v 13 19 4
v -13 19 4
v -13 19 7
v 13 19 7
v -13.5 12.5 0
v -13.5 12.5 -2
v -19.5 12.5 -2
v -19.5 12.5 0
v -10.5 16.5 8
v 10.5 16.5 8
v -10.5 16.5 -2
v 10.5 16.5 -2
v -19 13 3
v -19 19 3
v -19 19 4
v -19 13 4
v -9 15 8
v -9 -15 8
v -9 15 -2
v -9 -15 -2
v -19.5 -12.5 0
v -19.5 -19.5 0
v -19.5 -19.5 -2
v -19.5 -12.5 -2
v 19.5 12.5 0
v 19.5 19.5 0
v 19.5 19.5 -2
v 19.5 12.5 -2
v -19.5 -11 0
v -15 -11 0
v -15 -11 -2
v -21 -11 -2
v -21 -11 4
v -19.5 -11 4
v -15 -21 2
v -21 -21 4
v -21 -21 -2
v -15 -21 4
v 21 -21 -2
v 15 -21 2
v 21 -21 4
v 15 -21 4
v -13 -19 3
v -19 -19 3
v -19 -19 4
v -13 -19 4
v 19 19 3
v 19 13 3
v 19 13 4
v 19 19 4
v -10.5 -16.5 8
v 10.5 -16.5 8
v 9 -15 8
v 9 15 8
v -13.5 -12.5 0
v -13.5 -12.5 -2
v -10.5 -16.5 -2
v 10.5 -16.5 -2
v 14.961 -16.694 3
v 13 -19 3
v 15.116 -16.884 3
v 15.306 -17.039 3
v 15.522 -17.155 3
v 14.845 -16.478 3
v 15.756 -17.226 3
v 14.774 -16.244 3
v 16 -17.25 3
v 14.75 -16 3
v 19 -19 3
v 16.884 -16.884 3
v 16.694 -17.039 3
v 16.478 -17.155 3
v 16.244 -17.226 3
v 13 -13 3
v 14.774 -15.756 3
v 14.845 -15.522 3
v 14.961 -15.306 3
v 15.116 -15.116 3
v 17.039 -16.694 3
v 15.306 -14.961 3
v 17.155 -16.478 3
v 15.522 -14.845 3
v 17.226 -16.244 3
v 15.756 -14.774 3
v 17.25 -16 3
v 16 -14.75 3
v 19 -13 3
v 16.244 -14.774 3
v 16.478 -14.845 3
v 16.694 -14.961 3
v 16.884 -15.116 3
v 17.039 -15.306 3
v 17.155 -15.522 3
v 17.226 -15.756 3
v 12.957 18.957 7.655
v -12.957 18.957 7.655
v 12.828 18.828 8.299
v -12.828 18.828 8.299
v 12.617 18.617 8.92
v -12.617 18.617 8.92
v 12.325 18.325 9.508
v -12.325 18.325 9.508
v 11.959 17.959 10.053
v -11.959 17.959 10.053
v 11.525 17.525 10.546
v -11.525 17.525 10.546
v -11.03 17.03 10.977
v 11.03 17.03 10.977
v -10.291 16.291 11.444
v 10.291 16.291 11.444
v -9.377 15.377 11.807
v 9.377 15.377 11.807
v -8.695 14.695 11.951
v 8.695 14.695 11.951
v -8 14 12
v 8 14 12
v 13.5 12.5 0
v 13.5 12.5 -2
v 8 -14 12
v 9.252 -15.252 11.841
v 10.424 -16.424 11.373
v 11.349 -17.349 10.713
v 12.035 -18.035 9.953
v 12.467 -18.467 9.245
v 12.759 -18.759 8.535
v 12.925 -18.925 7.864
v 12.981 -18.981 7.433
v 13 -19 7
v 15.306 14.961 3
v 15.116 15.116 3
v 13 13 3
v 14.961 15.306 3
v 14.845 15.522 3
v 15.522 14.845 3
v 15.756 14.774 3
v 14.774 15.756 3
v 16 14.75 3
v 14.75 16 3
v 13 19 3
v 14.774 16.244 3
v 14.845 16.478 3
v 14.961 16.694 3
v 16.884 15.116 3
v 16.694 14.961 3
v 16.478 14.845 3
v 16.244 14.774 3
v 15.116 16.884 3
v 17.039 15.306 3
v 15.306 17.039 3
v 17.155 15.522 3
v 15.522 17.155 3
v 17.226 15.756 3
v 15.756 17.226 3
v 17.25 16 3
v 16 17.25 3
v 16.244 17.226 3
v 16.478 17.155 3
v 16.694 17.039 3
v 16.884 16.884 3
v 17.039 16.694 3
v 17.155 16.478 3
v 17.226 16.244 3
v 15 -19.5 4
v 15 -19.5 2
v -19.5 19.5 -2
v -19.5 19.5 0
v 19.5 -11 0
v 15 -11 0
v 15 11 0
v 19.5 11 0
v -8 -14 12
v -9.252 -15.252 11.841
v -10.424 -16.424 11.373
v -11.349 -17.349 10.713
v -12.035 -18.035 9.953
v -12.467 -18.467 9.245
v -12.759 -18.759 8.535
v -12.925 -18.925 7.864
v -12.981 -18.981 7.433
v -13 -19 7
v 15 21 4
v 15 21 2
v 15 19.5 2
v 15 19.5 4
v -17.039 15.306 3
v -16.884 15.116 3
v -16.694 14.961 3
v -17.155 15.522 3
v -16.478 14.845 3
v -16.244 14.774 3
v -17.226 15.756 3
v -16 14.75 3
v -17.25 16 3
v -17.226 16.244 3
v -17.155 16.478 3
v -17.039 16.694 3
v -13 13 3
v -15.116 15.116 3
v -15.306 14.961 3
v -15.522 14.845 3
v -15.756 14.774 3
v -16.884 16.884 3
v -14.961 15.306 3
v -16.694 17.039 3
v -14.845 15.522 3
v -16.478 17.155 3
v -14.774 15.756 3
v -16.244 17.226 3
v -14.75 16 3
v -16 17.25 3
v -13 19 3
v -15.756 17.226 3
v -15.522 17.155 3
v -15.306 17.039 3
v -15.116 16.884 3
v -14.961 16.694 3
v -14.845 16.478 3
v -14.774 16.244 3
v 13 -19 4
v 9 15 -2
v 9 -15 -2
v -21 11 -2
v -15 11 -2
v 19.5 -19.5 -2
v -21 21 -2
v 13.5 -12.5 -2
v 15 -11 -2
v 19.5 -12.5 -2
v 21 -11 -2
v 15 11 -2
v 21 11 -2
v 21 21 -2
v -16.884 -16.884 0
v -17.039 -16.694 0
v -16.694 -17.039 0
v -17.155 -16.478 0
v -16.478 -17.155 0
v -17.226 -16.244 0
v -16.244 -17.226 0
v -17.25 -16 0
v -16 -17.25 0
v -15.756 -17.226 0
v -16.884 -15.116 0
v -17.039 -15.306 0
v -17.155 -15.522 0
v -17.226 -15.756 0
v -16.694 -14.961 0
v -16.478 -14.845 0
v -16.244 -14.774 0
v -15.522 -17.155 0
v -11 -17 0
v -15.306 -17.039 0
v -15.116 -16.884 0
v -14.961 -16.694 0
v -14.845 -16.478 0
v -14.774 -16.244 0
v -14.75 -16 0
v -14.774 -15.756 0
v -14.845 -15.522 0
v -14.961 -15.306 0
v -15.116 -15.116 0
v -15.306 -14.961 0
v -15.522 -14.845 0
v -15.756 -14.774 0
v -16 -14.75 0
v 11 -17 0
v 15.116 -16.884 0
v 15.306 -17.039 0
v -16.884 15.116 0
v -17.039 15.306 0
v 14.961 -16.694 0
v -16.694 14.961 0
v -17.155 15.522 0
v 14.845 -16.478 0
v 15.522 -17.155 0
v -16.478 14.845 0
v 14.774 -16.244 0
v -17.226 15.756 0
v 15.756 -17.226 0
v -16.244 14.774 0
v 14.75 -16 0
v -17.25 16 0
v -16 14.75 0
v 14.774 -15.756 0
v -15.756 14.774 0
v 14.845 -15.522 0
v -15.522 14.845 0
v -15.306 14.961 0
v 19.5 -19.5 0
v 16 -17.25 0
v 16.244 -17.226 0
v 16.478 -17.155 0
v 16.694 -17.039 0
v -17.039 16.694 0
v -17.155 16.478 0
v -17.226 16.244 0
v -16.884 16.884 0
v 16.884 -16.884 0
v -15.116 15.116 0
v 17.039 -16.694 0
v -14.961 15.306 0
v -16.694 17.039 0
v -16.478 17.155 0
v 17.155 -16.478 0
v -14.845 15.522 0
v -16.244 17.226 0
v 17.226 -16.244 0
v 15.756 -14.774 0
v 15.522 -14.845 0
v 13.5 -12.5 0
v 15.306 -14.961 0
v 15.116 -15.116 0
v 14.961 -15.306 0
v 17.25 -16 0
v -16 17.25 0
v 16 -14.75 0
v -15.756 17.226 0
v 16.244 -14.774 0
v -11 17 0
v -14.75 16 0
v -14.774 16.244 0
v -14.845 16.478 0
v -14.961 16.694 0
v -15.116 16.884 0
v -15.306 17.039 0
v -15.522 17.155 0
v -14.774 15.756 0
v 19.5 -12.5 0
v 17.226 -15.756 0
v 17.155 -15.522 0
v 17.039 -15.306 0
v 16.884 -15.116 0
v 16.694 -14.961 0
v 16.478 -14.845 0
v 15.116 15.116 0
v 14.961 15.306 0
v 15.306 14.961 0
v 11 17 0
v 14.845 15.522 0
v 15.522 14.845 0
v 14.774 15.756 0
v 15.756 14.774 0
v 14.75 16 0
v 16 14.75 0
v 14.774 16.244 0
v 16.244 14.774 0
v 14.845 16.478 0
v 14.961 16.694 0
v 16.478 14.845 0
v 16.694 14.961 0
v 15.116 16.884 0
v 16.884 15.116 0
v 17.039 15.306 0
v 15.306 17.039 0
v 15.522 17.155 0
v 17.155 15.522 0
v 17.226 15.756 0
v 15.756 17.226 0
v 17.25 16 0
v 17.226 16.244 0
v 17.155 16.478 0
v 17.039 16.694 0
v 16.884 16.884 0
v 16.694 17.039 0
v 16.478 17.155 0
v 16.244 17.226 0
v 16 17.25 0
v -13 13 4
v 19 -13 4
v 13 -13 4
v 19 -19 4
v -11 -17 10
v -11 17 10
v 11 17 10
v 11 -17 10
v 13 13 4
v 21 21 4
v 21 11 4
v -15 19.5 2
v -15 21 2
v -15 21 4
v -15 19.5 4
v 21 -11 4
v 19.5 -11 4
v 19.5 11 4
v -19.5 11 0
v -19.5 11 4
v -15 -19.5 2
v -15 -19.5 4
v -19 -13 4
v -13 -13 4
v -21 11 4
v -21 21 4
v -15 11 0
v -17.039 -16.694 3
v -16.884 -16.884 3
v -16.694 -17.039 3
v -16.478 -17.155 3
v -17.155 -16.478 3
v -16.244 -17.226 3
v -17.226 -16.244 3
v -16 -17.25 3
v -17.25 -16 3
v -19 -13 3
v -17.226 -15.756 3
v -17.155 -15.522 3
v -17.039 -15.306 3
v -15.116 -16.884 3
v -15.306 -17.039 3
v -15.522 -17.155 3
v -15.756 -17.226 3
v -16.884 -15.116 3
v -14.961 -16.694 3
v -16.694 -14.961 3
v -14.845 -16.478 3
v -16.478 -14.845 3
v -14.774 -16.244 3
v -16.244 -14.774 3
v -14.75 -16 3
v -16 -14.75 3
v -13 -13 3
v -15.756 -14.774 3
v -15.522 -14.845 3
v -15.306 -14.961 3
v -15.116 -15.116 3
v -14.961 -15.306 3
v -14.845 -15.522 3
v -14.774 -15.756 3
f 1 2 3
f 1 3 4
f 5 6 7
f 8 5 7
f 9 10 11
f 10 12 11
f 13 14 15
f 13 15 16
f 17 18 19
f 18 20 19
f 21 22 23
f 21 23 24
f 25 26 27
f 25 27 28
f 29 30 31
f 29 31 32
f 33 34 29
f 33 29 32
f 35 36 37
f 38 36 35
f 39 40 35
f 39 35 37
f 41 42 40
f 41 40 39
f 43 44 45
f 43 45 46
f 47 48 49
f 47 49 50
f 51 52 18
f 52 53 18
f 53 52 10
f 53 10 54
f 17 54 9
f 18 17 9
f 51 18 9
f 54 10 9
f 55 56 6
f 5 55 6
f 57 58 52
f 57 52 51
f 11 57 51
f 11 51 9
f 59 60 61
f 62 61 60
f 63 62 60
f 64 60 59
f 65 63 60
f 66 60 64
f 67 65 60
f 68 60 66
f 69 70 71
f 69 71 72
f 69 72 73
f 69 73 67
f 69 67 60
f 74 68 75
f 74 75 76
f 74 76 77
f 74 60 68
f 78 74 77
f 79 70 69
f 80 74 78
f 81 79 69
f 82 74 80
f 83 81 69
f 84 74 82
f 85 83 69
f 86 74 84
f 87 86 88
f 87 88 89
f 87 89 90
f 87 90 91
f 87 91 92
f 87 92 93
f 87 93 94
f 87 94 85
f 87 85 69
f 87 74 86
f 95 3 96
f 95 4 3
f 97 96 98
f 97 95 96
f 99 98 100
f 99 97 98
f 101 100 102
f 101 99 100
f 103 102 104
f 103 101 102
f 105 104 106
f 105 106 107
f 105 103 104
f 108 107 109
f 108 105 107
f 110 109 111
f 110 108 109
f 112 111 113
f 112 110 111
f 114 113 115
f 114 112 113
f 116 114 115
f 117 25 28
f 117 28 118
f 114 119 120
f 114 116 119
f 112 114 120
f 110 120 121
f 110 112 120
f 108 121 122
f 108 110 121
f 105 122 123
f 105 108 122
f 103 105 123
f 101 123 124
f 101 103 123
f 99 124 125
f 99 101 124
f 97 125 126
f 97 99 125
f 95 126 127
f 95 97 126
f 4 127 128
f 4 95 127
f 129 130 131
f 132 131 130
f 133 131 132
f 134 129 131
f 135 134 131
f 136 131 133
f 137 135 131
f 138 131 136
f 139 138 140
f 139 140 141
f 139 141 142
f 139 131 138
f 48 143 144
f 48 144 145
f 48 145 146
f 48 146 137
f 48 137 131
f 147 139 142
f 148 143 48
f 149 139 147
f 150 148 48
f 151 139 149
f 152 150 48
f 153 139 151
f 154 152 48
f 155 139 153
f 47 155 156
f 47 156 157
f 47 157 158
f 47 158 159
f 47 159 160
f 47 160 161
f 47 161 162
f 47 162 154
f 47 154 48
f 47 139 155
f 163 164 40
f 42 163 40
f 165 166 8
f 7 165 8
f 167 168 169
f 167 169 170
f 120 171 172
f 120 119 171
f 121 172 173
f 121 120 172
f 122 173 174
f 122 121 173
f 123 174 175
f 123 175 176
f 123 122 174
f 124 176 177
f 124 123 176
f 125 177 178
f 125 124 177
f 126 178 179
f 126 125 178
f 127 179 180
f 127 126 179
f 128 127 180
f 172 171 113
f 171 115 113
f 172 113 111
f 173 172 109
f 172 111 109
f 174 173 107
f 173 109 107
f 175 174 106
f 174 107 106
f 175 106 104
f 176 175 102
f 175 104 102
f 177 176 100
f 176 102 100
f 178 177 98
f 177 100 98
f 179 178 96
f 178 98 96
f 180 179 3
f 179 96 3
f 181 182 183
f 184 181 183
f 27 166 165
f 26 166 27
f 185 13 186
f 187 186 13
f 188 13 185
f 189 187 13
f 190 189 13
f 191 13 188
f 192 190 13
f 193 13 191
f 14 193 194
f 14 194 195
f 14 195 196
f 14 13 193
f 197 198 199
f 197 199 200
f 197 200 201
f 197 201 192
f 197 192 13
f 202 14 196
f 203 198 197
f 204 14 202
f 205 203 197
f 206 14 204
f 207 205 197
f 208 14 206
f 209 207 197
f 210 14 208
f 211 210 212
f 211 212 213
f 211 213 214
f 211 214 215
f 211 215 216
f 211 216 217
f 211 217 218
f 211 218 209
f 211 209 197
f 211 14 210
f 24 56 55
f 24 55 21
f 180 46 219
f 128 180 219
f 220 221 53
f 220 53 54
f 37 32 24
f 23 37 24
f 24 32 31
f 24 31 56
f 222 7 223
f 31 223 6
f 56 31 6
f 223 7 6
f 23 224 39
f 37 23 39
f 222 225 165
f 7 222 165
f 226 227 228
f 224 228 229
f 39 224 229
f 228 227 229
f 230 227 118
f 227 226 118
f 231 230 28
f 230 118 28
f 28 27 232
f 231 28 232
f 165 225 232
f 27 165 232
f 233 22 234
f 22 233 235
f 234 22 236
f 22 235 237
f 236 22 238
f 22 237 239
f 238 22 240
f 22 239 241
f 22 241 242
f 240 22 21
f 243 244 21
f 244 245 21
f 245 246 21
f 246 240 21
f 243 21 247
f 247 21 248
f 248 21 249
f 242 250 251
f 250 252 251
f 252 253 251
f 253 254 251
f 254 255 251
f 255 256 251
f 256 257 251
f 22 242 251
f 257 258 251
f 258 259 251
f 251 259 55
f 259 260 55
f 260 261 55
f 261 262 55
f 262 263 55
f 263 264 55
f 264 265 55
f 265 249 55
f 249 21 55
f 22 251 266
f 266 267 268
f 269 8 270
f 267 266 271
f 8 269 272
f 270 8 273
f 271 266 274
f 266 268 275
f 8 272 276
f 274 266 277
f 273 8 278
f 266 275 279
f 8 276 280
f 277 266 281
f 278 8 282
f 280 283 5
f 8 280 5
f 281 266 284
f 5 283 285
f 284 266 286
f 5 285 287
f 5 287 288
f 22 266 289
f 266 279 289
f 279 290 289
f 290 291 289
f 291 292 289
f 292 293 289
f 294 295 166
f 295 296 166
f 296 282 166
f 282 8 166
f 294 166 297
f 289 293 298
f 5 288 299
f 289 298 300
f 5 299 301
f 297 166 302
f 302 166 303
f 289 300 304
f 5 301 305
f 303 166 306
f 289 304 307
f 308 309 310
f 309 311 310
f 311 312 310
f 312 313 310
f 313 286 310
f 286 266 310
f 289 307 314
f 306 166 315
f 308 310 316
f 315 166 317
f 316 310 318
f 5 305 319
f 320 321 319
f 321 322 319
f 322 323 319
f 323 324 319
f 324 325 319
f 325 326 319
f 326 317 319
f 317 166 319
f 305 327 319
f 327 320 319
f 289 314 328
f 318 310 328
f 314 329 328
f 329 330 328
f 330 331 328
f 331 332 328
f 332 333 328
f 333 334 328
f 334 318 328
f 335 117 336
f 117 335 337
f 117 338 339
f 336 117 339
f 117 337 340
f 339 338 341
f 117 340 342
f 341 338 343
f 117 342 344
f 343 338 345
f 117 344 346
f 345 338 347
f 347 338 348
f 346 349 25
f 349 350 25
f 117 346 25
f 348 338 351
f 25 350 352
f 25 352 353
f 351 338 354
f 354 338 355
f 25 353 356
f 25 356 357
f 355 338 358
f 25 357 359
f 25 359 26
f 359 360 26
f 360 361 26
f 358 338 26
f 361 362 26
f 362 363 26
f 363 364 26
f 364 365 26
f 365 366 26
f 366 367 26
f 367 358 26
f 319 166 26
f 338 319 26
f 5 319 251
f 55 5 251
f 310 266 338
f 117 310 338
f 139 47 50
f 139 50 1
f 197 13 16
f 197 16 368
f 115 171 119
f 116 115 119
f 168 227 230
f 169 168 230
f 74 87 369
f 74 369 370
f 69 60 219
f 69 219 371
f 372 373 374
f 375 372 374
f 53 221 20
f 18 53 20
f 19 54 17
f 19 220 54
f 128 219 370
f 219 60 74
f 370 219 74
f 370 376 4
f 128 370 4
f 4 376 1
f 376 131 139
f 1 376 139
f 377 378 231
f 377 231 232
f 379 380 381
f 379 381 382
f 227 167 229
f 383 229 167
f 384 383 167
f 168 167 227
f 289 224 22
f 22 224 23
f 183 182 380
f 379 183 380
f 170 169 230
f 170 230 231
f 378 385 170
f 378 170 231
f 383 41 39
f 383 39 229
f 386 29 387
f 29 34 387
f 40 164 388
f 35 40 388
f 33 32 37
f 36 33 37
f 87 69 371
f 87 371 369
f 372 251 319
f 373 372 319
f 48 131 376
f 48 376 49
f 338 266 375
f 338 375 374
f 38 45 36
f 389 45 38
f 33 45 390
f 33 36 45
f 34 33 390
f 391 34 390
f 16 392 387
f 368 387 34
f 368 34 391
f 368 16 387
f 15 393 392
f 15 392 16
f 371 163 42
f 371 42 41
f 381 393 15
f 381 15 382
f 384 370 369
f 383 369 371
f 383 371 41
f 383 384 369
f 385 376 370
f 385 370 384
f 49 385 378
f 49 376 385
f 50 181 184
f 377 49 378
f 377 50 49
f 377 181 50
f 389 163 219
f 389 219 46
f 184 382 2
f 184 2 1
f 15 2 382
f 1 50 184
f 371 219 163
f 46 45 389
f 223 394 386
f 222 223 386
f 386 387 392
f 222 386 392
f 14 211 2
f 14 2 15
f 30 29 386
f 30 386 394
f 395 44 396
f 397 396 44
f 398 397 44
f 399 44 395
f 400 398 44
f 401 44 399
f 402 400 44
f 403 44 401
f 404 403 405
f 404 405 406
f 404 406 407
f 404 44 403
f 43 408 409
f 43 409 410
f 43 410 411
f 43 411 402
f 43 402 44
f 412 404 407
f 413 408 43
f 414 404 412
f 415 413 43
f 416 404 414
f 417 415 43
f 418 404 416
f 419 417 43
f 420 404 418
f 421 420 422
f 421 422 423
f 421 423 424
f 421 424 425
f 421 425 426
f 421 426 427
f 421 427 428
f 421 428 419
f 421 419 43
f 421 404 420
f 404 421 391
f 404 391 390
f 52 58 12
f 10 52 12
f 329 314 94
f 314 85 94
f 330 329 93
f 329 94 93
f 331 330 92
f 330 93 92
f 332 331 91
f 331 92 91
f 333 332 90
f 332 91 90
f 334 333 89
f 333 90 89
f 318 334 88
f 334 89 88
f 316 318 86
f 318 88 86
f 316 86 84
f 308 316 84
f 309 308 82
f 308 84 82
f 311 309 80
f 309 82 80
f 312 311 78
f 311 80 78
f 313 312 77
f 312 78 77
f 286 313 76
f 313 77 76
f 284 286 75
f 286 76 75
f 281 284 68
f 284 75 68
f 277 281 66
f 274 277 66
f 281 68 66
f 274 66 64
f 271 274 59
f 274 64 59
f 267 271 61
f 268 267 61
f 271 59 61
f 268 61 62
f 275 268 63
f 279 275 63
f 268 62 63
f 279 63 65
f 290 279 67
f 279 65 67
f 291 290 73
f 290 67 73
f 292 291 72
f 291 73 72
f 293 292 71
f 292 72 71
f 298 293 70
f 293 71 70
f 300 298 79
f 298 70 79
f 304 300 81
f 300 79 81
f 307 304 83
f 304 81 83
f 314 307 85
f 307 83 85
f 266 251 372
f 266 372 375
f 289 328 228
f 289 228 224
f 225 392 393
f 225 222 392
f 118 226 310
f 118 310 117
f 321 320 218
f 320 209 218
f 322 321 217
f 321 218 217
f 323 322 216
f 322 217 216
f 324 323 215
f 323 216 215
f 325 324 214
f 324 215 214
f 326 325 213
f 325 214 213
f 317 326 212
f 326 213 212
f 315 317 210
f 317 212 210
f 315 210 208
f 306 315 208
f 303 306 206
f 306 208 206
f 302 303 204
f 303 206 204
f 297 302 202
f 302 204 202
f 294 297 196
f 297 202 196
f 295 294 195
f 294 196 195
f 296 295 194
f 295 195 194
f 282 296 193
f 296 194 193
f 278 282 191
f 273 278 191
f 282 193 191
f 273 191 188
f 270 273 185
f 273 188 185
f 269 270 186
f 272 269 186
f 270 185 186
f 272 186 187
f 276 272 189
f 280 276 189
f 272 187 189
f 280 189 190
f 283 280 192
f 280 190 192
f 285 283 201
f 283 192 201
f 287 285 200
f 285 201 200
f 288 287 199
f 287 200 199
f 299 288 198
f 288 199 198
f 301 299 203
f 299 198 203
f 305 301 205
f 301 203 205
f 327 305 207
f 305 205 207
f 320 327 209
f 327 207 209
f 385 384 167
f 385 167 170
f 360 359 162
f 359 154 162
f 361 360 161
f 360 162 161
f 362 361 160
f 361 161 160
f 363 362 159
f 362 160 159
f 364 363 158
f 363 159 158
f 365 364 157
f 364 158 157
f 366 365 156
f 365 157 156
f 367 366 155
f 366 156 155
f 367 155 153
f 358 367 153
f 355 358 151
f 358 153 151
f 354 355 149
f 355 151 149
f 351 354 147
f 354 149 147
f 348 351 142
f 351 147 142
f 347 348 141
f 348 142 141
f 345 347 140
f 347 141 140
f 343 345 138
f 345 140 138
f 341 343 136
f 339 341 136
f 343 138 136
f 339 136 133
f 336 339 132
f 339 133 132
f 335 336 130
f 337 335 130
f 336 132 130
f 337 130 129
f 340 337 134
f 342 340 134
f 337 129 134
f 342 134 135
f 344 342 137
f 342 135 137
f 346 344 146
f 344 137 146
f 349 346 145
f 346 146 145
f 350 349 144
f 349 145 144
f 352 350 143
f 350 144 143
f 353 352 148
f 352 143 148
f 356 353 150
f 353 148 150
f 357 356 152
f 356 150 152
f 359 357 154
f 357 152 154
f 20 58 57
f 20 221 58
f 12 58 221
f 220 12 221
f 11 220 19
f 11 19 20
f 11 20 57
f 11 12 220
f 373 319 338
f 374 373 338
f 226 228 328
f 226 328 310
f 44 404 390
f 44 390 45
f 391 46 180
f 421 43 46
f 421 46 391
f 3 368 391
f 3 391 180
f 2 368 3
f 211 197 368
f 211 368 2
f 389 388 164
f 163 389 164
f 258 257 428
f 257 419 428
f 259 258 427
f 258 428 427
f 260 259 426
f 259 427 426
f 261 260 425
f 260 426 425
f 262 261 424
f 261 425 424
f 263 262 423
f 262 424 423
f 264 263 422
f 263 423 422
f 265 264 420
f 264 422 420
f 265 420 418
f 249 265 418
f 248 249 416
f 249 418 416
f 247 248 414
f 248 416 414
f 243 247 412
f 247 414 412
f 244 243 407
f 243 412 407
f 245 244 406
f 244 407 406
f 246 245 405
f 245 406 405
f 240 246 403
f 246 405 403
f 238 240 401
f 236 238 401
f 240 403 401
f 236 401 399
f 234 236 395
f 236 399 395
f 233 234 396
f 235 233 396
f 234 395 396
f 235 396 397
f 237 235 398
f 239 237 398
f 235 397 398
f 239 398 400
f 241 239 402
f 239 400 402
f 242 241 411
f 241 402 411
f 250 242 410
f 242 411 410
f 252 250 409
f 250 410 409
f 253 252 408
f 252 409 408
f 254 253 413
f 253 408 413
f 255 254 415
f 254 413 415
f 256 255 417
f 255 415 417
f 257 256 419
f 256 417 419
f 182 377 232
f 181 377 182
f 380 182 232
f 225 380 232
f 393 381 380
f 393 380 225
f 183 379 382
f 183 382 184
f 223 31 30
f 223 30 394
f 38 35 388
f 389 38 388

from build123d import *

# Parameters (mm, degrees)
SKETCH_1_W               = 26
SKETCH_1_H               = 38
EXTRUDE_1_DEPTH          = 12
SKETCH_2_W               = 22
SKETCH_2_H               = 34
CUT_EXTRUDE_1_DEPTH      = 10
SKETCH_4_W               = 6
SKETCH_4_H               = 6
EXTRUDE_2_DEPTH          = 3
FILLET_1_R               = 5
SKETCH_6_W               = 30
SKETCH_6_H               = 42
SKETCH_6_W_2             = 27
SKETCH_6_H_2             = 39
EXTRUDE_3_DEPTH          = 2
EXTRUDE_3_DEPTH_BACK     = 2
SKETCH_5_R               = 1.25
CUT_EXTRUDE_4_DEPTH      = 13
CUT_EXTRUDE_4_DEPTH_BACK = 3
CUT_EXTRUDE_START        = 5
SKETCH_7_W               = 7
SKETCH_7_H               = 7
CUT_EXTRUDE_5_DEPTH      = 2
EXTRUDE_4_DEPTH          = 4
EXTRUDE_4_DEPTH_BACK     = 2
SKETCH_9_W               = 21
SKETCH_9_H               = 33
SKETCH_9_W_2             = 18
SKETCH_9_H_2             = 30
EXTRUDE_5_DEPTH          = 2
EXTRUDE_5_DEPTH_BACK     = 8
SKETCH_11_W              = 39
SKETCH_11_H              = 39
EXTRUDE_9_DEPTH          = 2
EXTRUDE_9_DEPTH_BACK     = 2


with BuildPart() as part:
    # ｽｹｯﾁ1 → ﾎﾞｽ - 押し出し1 (new body)
    with BuildSketch(Plane.XY):
        Rectangle(SKETCH_1_W, SKETCH_1_H)
    extrude(amount=EXTRUDE_1_DEPTH)

    # ｽｹｯﾁ2 → ｶｯﾄ - 押し出し1 (cut)
    with BuildSketch(Plane.XY):
        Rectangle(SKETCH_2_W, SKETCH_2_H)
    extrude(amount=CUT_EXTRUDE_1_DEPTH, mode=Mode.SUBTRACT)

    # ｽｹｯﾁ4 → ﾎﾞｽ - 押し出し2 (add)
    with BuildSketch(Plane.XY):
        with Locations((16, 16)):
            Rectangle(SKETCH_4_W, SKETCH_4_H)
        with Locations((16, -16)):
            Rectangle(SKETCH_4_W, SKETCH_4_H)
        with Locations((-16, -16)):
            Rectangle(SKETCH_4_W, SKETCH_4_H)
        with Locations((-16, 16)):
            Rectangle(SKETCH_4_W, SKETCH_4_H)
    extrude(amount=EXTRUDE_2_DEPTH)

    # ﾌｨﾚｯﾄ1
    fillet_1_edges = [part.edges().sort_by_distance(p)[0] for p in [
        (0, 19, 12),
        (0, -19, 12),
        (13, 0, 12),
        (-13, 0, 12),
    ]]
    fillet(fillet_1_edges, radius=FILLET_1_R)

    # ｽｹｯﾁ6 → ﾎﾞｽ - 押し出し3 (add, two sides)
    with BuildSketch(Plane(origin=(0, 0, 0), x_dir=(-1, 0, 0), z_dir=(0, 0, -1))) as extrude_3_sk:
        Rectangle(SKETCH_6_W, SKETCH_6_H)
        Rectangle(SKETCH_6_W_2, SKETCH_6_H_2, mode=Mode.SUBTRACT)
    extrude(amount=EXTRUDE_3_DEPTH)
    extrude(extrude_3_sk.sketch, amount=-EXTRUDE_3_DEPTH_BACK)

    # ｽｹｯﾁ5 → ｶｯﾄ - 押し出し4 (cut, two sides)
    with BuildSketch(Plane.XY) as cut_extrude_4_sk:
        with Locations((-16, 16)):
            Circle(SKETCH_5_R)
        with Locations((-16, -16)):
            Circle(SKETCH_5_R)
        with Locations((16, -16)):
            Circle(SKETCH_5_R)
        with Locations((16, 16)):
            Circle(SKETCH_5_R)
    extrude(amount=CUT_EXTRUDE_4_DEPTH, mode=Mode.SUBTRACT)
    extrude(cut_extrude_4_sk.sketch, amount=-CUT_EXTRUDE_4_DEPTH_BACK, mode=Mode.SUBTRACT)

    # ｽｹｯﾁ7 → ｶｯﾄ - 押し出し5 (cut)
    with BuildSketch(Plane(origin=(0, 0, 3), x_dir=(-1, 0, 0), z_dir=(0, 0, -1)).offset(CUT_EXTRUDE_START)):
        with Locations((-16, 16)):
            Rectangle(SKETCH_7_W, SKETCH_7_H)
        with Locations((16, 16)):
            Rectangle(SKETCH_7_W, SKETCH_7_H)
        with Locations((16, -16)):
            Rectangle(SKETCH_7_W, SKETCH_7_H)
        with Locations((-16, -16)):
            Rectangle(SKETCH_7_W, SKETCH_7_H)
    extrude(amount=-CUT_EXTRUDE_5_DEPTH, mode=Mode.SUBTRACT)

    # ｽｹｯﾁ8 → ﾎﾞｽ - 押し出し4 (add, two sides)
    with BuildSketch(Plane.XY) as extrude_4_sk:
        Polygon((15, 21), (15, 19.5), (19.5, 19.5), (19.5, 12.5), (15, 12.5), (15, 11), (21, 11), (21, 21), align=None)
        Polygon((-15, 21), (-15, 19.5), (-19.5, 19.5), (-19.5, 12.5), (-15, 12.5), (-15, 11), (-21, 11), (-21, 21), align=None)
        Polygon((15, -21), (21, -21), (21, -11), (15, -11), (15, -12.5), (19.5, -12.5), (19.5, -19.5), (15, -19.5), align=None)
        Polygon((-21, -21), (-15, -21), (-15, -19.5), (-19.5, -19.5), (-19.5, -12.5), (-15, -12.5), (-15, -11), (-21, -11), align=None)
    extrude(amount=EXTRUDE_4_DEPTH)
    extrude(extrude_4_sk.sketch, amount=-EXTRUDE_4_DEPTH_BACK)

    # ｽｹｯﾁ11 → ﾎﾞｽ - 押し出し9 (add, two sides)
    with BuildSketch(Plane.XY.offset(2)) as extrude_9_sk:
        Rectangle(SKETCH_11_W, SKETCH_11_H)
        Polygon((-19, 13), (-13, 13), (-13, -13), (-19, -13), (-19, -19), (19, -19), (19, -13), (13, -13), (13, 13), (19, 13), (19, 19), (-19, 19), align=None, mode=Mode.SUBTRACT)
    extrude(amount=EXTRUDE_9_DEPTH)
    extrude(extrude_9_sk.sketch, amount=-EXTRUDE_9_DEPTH_BACK)


with BuildPart() as body_2:
    # ｽｹｯﾁ9 → ﾎﾞｽ - 押し出し5 (new body, two sides)
    with BuildSketch(Plane(origin=(0, 0, 0), x_dir=(-1, 0, 0), z_dir=(0, 0, -1))) as extrude_5_sk:
        Rectangle(SKETCH_9_W, SKETCH_9_H)
        Rectangle(SKETCH_9_W_2, SKETCH_9_H_2, mode=Mode.SUBTRACT)
    extrude(amount=EXTRUDE_5_DEPTH)
    extrude(extrude_5_sk.sketch, amount=-EXTRUDE_5_DEPTH_BACK)


solid = Compound([part.part, body_2.part])
